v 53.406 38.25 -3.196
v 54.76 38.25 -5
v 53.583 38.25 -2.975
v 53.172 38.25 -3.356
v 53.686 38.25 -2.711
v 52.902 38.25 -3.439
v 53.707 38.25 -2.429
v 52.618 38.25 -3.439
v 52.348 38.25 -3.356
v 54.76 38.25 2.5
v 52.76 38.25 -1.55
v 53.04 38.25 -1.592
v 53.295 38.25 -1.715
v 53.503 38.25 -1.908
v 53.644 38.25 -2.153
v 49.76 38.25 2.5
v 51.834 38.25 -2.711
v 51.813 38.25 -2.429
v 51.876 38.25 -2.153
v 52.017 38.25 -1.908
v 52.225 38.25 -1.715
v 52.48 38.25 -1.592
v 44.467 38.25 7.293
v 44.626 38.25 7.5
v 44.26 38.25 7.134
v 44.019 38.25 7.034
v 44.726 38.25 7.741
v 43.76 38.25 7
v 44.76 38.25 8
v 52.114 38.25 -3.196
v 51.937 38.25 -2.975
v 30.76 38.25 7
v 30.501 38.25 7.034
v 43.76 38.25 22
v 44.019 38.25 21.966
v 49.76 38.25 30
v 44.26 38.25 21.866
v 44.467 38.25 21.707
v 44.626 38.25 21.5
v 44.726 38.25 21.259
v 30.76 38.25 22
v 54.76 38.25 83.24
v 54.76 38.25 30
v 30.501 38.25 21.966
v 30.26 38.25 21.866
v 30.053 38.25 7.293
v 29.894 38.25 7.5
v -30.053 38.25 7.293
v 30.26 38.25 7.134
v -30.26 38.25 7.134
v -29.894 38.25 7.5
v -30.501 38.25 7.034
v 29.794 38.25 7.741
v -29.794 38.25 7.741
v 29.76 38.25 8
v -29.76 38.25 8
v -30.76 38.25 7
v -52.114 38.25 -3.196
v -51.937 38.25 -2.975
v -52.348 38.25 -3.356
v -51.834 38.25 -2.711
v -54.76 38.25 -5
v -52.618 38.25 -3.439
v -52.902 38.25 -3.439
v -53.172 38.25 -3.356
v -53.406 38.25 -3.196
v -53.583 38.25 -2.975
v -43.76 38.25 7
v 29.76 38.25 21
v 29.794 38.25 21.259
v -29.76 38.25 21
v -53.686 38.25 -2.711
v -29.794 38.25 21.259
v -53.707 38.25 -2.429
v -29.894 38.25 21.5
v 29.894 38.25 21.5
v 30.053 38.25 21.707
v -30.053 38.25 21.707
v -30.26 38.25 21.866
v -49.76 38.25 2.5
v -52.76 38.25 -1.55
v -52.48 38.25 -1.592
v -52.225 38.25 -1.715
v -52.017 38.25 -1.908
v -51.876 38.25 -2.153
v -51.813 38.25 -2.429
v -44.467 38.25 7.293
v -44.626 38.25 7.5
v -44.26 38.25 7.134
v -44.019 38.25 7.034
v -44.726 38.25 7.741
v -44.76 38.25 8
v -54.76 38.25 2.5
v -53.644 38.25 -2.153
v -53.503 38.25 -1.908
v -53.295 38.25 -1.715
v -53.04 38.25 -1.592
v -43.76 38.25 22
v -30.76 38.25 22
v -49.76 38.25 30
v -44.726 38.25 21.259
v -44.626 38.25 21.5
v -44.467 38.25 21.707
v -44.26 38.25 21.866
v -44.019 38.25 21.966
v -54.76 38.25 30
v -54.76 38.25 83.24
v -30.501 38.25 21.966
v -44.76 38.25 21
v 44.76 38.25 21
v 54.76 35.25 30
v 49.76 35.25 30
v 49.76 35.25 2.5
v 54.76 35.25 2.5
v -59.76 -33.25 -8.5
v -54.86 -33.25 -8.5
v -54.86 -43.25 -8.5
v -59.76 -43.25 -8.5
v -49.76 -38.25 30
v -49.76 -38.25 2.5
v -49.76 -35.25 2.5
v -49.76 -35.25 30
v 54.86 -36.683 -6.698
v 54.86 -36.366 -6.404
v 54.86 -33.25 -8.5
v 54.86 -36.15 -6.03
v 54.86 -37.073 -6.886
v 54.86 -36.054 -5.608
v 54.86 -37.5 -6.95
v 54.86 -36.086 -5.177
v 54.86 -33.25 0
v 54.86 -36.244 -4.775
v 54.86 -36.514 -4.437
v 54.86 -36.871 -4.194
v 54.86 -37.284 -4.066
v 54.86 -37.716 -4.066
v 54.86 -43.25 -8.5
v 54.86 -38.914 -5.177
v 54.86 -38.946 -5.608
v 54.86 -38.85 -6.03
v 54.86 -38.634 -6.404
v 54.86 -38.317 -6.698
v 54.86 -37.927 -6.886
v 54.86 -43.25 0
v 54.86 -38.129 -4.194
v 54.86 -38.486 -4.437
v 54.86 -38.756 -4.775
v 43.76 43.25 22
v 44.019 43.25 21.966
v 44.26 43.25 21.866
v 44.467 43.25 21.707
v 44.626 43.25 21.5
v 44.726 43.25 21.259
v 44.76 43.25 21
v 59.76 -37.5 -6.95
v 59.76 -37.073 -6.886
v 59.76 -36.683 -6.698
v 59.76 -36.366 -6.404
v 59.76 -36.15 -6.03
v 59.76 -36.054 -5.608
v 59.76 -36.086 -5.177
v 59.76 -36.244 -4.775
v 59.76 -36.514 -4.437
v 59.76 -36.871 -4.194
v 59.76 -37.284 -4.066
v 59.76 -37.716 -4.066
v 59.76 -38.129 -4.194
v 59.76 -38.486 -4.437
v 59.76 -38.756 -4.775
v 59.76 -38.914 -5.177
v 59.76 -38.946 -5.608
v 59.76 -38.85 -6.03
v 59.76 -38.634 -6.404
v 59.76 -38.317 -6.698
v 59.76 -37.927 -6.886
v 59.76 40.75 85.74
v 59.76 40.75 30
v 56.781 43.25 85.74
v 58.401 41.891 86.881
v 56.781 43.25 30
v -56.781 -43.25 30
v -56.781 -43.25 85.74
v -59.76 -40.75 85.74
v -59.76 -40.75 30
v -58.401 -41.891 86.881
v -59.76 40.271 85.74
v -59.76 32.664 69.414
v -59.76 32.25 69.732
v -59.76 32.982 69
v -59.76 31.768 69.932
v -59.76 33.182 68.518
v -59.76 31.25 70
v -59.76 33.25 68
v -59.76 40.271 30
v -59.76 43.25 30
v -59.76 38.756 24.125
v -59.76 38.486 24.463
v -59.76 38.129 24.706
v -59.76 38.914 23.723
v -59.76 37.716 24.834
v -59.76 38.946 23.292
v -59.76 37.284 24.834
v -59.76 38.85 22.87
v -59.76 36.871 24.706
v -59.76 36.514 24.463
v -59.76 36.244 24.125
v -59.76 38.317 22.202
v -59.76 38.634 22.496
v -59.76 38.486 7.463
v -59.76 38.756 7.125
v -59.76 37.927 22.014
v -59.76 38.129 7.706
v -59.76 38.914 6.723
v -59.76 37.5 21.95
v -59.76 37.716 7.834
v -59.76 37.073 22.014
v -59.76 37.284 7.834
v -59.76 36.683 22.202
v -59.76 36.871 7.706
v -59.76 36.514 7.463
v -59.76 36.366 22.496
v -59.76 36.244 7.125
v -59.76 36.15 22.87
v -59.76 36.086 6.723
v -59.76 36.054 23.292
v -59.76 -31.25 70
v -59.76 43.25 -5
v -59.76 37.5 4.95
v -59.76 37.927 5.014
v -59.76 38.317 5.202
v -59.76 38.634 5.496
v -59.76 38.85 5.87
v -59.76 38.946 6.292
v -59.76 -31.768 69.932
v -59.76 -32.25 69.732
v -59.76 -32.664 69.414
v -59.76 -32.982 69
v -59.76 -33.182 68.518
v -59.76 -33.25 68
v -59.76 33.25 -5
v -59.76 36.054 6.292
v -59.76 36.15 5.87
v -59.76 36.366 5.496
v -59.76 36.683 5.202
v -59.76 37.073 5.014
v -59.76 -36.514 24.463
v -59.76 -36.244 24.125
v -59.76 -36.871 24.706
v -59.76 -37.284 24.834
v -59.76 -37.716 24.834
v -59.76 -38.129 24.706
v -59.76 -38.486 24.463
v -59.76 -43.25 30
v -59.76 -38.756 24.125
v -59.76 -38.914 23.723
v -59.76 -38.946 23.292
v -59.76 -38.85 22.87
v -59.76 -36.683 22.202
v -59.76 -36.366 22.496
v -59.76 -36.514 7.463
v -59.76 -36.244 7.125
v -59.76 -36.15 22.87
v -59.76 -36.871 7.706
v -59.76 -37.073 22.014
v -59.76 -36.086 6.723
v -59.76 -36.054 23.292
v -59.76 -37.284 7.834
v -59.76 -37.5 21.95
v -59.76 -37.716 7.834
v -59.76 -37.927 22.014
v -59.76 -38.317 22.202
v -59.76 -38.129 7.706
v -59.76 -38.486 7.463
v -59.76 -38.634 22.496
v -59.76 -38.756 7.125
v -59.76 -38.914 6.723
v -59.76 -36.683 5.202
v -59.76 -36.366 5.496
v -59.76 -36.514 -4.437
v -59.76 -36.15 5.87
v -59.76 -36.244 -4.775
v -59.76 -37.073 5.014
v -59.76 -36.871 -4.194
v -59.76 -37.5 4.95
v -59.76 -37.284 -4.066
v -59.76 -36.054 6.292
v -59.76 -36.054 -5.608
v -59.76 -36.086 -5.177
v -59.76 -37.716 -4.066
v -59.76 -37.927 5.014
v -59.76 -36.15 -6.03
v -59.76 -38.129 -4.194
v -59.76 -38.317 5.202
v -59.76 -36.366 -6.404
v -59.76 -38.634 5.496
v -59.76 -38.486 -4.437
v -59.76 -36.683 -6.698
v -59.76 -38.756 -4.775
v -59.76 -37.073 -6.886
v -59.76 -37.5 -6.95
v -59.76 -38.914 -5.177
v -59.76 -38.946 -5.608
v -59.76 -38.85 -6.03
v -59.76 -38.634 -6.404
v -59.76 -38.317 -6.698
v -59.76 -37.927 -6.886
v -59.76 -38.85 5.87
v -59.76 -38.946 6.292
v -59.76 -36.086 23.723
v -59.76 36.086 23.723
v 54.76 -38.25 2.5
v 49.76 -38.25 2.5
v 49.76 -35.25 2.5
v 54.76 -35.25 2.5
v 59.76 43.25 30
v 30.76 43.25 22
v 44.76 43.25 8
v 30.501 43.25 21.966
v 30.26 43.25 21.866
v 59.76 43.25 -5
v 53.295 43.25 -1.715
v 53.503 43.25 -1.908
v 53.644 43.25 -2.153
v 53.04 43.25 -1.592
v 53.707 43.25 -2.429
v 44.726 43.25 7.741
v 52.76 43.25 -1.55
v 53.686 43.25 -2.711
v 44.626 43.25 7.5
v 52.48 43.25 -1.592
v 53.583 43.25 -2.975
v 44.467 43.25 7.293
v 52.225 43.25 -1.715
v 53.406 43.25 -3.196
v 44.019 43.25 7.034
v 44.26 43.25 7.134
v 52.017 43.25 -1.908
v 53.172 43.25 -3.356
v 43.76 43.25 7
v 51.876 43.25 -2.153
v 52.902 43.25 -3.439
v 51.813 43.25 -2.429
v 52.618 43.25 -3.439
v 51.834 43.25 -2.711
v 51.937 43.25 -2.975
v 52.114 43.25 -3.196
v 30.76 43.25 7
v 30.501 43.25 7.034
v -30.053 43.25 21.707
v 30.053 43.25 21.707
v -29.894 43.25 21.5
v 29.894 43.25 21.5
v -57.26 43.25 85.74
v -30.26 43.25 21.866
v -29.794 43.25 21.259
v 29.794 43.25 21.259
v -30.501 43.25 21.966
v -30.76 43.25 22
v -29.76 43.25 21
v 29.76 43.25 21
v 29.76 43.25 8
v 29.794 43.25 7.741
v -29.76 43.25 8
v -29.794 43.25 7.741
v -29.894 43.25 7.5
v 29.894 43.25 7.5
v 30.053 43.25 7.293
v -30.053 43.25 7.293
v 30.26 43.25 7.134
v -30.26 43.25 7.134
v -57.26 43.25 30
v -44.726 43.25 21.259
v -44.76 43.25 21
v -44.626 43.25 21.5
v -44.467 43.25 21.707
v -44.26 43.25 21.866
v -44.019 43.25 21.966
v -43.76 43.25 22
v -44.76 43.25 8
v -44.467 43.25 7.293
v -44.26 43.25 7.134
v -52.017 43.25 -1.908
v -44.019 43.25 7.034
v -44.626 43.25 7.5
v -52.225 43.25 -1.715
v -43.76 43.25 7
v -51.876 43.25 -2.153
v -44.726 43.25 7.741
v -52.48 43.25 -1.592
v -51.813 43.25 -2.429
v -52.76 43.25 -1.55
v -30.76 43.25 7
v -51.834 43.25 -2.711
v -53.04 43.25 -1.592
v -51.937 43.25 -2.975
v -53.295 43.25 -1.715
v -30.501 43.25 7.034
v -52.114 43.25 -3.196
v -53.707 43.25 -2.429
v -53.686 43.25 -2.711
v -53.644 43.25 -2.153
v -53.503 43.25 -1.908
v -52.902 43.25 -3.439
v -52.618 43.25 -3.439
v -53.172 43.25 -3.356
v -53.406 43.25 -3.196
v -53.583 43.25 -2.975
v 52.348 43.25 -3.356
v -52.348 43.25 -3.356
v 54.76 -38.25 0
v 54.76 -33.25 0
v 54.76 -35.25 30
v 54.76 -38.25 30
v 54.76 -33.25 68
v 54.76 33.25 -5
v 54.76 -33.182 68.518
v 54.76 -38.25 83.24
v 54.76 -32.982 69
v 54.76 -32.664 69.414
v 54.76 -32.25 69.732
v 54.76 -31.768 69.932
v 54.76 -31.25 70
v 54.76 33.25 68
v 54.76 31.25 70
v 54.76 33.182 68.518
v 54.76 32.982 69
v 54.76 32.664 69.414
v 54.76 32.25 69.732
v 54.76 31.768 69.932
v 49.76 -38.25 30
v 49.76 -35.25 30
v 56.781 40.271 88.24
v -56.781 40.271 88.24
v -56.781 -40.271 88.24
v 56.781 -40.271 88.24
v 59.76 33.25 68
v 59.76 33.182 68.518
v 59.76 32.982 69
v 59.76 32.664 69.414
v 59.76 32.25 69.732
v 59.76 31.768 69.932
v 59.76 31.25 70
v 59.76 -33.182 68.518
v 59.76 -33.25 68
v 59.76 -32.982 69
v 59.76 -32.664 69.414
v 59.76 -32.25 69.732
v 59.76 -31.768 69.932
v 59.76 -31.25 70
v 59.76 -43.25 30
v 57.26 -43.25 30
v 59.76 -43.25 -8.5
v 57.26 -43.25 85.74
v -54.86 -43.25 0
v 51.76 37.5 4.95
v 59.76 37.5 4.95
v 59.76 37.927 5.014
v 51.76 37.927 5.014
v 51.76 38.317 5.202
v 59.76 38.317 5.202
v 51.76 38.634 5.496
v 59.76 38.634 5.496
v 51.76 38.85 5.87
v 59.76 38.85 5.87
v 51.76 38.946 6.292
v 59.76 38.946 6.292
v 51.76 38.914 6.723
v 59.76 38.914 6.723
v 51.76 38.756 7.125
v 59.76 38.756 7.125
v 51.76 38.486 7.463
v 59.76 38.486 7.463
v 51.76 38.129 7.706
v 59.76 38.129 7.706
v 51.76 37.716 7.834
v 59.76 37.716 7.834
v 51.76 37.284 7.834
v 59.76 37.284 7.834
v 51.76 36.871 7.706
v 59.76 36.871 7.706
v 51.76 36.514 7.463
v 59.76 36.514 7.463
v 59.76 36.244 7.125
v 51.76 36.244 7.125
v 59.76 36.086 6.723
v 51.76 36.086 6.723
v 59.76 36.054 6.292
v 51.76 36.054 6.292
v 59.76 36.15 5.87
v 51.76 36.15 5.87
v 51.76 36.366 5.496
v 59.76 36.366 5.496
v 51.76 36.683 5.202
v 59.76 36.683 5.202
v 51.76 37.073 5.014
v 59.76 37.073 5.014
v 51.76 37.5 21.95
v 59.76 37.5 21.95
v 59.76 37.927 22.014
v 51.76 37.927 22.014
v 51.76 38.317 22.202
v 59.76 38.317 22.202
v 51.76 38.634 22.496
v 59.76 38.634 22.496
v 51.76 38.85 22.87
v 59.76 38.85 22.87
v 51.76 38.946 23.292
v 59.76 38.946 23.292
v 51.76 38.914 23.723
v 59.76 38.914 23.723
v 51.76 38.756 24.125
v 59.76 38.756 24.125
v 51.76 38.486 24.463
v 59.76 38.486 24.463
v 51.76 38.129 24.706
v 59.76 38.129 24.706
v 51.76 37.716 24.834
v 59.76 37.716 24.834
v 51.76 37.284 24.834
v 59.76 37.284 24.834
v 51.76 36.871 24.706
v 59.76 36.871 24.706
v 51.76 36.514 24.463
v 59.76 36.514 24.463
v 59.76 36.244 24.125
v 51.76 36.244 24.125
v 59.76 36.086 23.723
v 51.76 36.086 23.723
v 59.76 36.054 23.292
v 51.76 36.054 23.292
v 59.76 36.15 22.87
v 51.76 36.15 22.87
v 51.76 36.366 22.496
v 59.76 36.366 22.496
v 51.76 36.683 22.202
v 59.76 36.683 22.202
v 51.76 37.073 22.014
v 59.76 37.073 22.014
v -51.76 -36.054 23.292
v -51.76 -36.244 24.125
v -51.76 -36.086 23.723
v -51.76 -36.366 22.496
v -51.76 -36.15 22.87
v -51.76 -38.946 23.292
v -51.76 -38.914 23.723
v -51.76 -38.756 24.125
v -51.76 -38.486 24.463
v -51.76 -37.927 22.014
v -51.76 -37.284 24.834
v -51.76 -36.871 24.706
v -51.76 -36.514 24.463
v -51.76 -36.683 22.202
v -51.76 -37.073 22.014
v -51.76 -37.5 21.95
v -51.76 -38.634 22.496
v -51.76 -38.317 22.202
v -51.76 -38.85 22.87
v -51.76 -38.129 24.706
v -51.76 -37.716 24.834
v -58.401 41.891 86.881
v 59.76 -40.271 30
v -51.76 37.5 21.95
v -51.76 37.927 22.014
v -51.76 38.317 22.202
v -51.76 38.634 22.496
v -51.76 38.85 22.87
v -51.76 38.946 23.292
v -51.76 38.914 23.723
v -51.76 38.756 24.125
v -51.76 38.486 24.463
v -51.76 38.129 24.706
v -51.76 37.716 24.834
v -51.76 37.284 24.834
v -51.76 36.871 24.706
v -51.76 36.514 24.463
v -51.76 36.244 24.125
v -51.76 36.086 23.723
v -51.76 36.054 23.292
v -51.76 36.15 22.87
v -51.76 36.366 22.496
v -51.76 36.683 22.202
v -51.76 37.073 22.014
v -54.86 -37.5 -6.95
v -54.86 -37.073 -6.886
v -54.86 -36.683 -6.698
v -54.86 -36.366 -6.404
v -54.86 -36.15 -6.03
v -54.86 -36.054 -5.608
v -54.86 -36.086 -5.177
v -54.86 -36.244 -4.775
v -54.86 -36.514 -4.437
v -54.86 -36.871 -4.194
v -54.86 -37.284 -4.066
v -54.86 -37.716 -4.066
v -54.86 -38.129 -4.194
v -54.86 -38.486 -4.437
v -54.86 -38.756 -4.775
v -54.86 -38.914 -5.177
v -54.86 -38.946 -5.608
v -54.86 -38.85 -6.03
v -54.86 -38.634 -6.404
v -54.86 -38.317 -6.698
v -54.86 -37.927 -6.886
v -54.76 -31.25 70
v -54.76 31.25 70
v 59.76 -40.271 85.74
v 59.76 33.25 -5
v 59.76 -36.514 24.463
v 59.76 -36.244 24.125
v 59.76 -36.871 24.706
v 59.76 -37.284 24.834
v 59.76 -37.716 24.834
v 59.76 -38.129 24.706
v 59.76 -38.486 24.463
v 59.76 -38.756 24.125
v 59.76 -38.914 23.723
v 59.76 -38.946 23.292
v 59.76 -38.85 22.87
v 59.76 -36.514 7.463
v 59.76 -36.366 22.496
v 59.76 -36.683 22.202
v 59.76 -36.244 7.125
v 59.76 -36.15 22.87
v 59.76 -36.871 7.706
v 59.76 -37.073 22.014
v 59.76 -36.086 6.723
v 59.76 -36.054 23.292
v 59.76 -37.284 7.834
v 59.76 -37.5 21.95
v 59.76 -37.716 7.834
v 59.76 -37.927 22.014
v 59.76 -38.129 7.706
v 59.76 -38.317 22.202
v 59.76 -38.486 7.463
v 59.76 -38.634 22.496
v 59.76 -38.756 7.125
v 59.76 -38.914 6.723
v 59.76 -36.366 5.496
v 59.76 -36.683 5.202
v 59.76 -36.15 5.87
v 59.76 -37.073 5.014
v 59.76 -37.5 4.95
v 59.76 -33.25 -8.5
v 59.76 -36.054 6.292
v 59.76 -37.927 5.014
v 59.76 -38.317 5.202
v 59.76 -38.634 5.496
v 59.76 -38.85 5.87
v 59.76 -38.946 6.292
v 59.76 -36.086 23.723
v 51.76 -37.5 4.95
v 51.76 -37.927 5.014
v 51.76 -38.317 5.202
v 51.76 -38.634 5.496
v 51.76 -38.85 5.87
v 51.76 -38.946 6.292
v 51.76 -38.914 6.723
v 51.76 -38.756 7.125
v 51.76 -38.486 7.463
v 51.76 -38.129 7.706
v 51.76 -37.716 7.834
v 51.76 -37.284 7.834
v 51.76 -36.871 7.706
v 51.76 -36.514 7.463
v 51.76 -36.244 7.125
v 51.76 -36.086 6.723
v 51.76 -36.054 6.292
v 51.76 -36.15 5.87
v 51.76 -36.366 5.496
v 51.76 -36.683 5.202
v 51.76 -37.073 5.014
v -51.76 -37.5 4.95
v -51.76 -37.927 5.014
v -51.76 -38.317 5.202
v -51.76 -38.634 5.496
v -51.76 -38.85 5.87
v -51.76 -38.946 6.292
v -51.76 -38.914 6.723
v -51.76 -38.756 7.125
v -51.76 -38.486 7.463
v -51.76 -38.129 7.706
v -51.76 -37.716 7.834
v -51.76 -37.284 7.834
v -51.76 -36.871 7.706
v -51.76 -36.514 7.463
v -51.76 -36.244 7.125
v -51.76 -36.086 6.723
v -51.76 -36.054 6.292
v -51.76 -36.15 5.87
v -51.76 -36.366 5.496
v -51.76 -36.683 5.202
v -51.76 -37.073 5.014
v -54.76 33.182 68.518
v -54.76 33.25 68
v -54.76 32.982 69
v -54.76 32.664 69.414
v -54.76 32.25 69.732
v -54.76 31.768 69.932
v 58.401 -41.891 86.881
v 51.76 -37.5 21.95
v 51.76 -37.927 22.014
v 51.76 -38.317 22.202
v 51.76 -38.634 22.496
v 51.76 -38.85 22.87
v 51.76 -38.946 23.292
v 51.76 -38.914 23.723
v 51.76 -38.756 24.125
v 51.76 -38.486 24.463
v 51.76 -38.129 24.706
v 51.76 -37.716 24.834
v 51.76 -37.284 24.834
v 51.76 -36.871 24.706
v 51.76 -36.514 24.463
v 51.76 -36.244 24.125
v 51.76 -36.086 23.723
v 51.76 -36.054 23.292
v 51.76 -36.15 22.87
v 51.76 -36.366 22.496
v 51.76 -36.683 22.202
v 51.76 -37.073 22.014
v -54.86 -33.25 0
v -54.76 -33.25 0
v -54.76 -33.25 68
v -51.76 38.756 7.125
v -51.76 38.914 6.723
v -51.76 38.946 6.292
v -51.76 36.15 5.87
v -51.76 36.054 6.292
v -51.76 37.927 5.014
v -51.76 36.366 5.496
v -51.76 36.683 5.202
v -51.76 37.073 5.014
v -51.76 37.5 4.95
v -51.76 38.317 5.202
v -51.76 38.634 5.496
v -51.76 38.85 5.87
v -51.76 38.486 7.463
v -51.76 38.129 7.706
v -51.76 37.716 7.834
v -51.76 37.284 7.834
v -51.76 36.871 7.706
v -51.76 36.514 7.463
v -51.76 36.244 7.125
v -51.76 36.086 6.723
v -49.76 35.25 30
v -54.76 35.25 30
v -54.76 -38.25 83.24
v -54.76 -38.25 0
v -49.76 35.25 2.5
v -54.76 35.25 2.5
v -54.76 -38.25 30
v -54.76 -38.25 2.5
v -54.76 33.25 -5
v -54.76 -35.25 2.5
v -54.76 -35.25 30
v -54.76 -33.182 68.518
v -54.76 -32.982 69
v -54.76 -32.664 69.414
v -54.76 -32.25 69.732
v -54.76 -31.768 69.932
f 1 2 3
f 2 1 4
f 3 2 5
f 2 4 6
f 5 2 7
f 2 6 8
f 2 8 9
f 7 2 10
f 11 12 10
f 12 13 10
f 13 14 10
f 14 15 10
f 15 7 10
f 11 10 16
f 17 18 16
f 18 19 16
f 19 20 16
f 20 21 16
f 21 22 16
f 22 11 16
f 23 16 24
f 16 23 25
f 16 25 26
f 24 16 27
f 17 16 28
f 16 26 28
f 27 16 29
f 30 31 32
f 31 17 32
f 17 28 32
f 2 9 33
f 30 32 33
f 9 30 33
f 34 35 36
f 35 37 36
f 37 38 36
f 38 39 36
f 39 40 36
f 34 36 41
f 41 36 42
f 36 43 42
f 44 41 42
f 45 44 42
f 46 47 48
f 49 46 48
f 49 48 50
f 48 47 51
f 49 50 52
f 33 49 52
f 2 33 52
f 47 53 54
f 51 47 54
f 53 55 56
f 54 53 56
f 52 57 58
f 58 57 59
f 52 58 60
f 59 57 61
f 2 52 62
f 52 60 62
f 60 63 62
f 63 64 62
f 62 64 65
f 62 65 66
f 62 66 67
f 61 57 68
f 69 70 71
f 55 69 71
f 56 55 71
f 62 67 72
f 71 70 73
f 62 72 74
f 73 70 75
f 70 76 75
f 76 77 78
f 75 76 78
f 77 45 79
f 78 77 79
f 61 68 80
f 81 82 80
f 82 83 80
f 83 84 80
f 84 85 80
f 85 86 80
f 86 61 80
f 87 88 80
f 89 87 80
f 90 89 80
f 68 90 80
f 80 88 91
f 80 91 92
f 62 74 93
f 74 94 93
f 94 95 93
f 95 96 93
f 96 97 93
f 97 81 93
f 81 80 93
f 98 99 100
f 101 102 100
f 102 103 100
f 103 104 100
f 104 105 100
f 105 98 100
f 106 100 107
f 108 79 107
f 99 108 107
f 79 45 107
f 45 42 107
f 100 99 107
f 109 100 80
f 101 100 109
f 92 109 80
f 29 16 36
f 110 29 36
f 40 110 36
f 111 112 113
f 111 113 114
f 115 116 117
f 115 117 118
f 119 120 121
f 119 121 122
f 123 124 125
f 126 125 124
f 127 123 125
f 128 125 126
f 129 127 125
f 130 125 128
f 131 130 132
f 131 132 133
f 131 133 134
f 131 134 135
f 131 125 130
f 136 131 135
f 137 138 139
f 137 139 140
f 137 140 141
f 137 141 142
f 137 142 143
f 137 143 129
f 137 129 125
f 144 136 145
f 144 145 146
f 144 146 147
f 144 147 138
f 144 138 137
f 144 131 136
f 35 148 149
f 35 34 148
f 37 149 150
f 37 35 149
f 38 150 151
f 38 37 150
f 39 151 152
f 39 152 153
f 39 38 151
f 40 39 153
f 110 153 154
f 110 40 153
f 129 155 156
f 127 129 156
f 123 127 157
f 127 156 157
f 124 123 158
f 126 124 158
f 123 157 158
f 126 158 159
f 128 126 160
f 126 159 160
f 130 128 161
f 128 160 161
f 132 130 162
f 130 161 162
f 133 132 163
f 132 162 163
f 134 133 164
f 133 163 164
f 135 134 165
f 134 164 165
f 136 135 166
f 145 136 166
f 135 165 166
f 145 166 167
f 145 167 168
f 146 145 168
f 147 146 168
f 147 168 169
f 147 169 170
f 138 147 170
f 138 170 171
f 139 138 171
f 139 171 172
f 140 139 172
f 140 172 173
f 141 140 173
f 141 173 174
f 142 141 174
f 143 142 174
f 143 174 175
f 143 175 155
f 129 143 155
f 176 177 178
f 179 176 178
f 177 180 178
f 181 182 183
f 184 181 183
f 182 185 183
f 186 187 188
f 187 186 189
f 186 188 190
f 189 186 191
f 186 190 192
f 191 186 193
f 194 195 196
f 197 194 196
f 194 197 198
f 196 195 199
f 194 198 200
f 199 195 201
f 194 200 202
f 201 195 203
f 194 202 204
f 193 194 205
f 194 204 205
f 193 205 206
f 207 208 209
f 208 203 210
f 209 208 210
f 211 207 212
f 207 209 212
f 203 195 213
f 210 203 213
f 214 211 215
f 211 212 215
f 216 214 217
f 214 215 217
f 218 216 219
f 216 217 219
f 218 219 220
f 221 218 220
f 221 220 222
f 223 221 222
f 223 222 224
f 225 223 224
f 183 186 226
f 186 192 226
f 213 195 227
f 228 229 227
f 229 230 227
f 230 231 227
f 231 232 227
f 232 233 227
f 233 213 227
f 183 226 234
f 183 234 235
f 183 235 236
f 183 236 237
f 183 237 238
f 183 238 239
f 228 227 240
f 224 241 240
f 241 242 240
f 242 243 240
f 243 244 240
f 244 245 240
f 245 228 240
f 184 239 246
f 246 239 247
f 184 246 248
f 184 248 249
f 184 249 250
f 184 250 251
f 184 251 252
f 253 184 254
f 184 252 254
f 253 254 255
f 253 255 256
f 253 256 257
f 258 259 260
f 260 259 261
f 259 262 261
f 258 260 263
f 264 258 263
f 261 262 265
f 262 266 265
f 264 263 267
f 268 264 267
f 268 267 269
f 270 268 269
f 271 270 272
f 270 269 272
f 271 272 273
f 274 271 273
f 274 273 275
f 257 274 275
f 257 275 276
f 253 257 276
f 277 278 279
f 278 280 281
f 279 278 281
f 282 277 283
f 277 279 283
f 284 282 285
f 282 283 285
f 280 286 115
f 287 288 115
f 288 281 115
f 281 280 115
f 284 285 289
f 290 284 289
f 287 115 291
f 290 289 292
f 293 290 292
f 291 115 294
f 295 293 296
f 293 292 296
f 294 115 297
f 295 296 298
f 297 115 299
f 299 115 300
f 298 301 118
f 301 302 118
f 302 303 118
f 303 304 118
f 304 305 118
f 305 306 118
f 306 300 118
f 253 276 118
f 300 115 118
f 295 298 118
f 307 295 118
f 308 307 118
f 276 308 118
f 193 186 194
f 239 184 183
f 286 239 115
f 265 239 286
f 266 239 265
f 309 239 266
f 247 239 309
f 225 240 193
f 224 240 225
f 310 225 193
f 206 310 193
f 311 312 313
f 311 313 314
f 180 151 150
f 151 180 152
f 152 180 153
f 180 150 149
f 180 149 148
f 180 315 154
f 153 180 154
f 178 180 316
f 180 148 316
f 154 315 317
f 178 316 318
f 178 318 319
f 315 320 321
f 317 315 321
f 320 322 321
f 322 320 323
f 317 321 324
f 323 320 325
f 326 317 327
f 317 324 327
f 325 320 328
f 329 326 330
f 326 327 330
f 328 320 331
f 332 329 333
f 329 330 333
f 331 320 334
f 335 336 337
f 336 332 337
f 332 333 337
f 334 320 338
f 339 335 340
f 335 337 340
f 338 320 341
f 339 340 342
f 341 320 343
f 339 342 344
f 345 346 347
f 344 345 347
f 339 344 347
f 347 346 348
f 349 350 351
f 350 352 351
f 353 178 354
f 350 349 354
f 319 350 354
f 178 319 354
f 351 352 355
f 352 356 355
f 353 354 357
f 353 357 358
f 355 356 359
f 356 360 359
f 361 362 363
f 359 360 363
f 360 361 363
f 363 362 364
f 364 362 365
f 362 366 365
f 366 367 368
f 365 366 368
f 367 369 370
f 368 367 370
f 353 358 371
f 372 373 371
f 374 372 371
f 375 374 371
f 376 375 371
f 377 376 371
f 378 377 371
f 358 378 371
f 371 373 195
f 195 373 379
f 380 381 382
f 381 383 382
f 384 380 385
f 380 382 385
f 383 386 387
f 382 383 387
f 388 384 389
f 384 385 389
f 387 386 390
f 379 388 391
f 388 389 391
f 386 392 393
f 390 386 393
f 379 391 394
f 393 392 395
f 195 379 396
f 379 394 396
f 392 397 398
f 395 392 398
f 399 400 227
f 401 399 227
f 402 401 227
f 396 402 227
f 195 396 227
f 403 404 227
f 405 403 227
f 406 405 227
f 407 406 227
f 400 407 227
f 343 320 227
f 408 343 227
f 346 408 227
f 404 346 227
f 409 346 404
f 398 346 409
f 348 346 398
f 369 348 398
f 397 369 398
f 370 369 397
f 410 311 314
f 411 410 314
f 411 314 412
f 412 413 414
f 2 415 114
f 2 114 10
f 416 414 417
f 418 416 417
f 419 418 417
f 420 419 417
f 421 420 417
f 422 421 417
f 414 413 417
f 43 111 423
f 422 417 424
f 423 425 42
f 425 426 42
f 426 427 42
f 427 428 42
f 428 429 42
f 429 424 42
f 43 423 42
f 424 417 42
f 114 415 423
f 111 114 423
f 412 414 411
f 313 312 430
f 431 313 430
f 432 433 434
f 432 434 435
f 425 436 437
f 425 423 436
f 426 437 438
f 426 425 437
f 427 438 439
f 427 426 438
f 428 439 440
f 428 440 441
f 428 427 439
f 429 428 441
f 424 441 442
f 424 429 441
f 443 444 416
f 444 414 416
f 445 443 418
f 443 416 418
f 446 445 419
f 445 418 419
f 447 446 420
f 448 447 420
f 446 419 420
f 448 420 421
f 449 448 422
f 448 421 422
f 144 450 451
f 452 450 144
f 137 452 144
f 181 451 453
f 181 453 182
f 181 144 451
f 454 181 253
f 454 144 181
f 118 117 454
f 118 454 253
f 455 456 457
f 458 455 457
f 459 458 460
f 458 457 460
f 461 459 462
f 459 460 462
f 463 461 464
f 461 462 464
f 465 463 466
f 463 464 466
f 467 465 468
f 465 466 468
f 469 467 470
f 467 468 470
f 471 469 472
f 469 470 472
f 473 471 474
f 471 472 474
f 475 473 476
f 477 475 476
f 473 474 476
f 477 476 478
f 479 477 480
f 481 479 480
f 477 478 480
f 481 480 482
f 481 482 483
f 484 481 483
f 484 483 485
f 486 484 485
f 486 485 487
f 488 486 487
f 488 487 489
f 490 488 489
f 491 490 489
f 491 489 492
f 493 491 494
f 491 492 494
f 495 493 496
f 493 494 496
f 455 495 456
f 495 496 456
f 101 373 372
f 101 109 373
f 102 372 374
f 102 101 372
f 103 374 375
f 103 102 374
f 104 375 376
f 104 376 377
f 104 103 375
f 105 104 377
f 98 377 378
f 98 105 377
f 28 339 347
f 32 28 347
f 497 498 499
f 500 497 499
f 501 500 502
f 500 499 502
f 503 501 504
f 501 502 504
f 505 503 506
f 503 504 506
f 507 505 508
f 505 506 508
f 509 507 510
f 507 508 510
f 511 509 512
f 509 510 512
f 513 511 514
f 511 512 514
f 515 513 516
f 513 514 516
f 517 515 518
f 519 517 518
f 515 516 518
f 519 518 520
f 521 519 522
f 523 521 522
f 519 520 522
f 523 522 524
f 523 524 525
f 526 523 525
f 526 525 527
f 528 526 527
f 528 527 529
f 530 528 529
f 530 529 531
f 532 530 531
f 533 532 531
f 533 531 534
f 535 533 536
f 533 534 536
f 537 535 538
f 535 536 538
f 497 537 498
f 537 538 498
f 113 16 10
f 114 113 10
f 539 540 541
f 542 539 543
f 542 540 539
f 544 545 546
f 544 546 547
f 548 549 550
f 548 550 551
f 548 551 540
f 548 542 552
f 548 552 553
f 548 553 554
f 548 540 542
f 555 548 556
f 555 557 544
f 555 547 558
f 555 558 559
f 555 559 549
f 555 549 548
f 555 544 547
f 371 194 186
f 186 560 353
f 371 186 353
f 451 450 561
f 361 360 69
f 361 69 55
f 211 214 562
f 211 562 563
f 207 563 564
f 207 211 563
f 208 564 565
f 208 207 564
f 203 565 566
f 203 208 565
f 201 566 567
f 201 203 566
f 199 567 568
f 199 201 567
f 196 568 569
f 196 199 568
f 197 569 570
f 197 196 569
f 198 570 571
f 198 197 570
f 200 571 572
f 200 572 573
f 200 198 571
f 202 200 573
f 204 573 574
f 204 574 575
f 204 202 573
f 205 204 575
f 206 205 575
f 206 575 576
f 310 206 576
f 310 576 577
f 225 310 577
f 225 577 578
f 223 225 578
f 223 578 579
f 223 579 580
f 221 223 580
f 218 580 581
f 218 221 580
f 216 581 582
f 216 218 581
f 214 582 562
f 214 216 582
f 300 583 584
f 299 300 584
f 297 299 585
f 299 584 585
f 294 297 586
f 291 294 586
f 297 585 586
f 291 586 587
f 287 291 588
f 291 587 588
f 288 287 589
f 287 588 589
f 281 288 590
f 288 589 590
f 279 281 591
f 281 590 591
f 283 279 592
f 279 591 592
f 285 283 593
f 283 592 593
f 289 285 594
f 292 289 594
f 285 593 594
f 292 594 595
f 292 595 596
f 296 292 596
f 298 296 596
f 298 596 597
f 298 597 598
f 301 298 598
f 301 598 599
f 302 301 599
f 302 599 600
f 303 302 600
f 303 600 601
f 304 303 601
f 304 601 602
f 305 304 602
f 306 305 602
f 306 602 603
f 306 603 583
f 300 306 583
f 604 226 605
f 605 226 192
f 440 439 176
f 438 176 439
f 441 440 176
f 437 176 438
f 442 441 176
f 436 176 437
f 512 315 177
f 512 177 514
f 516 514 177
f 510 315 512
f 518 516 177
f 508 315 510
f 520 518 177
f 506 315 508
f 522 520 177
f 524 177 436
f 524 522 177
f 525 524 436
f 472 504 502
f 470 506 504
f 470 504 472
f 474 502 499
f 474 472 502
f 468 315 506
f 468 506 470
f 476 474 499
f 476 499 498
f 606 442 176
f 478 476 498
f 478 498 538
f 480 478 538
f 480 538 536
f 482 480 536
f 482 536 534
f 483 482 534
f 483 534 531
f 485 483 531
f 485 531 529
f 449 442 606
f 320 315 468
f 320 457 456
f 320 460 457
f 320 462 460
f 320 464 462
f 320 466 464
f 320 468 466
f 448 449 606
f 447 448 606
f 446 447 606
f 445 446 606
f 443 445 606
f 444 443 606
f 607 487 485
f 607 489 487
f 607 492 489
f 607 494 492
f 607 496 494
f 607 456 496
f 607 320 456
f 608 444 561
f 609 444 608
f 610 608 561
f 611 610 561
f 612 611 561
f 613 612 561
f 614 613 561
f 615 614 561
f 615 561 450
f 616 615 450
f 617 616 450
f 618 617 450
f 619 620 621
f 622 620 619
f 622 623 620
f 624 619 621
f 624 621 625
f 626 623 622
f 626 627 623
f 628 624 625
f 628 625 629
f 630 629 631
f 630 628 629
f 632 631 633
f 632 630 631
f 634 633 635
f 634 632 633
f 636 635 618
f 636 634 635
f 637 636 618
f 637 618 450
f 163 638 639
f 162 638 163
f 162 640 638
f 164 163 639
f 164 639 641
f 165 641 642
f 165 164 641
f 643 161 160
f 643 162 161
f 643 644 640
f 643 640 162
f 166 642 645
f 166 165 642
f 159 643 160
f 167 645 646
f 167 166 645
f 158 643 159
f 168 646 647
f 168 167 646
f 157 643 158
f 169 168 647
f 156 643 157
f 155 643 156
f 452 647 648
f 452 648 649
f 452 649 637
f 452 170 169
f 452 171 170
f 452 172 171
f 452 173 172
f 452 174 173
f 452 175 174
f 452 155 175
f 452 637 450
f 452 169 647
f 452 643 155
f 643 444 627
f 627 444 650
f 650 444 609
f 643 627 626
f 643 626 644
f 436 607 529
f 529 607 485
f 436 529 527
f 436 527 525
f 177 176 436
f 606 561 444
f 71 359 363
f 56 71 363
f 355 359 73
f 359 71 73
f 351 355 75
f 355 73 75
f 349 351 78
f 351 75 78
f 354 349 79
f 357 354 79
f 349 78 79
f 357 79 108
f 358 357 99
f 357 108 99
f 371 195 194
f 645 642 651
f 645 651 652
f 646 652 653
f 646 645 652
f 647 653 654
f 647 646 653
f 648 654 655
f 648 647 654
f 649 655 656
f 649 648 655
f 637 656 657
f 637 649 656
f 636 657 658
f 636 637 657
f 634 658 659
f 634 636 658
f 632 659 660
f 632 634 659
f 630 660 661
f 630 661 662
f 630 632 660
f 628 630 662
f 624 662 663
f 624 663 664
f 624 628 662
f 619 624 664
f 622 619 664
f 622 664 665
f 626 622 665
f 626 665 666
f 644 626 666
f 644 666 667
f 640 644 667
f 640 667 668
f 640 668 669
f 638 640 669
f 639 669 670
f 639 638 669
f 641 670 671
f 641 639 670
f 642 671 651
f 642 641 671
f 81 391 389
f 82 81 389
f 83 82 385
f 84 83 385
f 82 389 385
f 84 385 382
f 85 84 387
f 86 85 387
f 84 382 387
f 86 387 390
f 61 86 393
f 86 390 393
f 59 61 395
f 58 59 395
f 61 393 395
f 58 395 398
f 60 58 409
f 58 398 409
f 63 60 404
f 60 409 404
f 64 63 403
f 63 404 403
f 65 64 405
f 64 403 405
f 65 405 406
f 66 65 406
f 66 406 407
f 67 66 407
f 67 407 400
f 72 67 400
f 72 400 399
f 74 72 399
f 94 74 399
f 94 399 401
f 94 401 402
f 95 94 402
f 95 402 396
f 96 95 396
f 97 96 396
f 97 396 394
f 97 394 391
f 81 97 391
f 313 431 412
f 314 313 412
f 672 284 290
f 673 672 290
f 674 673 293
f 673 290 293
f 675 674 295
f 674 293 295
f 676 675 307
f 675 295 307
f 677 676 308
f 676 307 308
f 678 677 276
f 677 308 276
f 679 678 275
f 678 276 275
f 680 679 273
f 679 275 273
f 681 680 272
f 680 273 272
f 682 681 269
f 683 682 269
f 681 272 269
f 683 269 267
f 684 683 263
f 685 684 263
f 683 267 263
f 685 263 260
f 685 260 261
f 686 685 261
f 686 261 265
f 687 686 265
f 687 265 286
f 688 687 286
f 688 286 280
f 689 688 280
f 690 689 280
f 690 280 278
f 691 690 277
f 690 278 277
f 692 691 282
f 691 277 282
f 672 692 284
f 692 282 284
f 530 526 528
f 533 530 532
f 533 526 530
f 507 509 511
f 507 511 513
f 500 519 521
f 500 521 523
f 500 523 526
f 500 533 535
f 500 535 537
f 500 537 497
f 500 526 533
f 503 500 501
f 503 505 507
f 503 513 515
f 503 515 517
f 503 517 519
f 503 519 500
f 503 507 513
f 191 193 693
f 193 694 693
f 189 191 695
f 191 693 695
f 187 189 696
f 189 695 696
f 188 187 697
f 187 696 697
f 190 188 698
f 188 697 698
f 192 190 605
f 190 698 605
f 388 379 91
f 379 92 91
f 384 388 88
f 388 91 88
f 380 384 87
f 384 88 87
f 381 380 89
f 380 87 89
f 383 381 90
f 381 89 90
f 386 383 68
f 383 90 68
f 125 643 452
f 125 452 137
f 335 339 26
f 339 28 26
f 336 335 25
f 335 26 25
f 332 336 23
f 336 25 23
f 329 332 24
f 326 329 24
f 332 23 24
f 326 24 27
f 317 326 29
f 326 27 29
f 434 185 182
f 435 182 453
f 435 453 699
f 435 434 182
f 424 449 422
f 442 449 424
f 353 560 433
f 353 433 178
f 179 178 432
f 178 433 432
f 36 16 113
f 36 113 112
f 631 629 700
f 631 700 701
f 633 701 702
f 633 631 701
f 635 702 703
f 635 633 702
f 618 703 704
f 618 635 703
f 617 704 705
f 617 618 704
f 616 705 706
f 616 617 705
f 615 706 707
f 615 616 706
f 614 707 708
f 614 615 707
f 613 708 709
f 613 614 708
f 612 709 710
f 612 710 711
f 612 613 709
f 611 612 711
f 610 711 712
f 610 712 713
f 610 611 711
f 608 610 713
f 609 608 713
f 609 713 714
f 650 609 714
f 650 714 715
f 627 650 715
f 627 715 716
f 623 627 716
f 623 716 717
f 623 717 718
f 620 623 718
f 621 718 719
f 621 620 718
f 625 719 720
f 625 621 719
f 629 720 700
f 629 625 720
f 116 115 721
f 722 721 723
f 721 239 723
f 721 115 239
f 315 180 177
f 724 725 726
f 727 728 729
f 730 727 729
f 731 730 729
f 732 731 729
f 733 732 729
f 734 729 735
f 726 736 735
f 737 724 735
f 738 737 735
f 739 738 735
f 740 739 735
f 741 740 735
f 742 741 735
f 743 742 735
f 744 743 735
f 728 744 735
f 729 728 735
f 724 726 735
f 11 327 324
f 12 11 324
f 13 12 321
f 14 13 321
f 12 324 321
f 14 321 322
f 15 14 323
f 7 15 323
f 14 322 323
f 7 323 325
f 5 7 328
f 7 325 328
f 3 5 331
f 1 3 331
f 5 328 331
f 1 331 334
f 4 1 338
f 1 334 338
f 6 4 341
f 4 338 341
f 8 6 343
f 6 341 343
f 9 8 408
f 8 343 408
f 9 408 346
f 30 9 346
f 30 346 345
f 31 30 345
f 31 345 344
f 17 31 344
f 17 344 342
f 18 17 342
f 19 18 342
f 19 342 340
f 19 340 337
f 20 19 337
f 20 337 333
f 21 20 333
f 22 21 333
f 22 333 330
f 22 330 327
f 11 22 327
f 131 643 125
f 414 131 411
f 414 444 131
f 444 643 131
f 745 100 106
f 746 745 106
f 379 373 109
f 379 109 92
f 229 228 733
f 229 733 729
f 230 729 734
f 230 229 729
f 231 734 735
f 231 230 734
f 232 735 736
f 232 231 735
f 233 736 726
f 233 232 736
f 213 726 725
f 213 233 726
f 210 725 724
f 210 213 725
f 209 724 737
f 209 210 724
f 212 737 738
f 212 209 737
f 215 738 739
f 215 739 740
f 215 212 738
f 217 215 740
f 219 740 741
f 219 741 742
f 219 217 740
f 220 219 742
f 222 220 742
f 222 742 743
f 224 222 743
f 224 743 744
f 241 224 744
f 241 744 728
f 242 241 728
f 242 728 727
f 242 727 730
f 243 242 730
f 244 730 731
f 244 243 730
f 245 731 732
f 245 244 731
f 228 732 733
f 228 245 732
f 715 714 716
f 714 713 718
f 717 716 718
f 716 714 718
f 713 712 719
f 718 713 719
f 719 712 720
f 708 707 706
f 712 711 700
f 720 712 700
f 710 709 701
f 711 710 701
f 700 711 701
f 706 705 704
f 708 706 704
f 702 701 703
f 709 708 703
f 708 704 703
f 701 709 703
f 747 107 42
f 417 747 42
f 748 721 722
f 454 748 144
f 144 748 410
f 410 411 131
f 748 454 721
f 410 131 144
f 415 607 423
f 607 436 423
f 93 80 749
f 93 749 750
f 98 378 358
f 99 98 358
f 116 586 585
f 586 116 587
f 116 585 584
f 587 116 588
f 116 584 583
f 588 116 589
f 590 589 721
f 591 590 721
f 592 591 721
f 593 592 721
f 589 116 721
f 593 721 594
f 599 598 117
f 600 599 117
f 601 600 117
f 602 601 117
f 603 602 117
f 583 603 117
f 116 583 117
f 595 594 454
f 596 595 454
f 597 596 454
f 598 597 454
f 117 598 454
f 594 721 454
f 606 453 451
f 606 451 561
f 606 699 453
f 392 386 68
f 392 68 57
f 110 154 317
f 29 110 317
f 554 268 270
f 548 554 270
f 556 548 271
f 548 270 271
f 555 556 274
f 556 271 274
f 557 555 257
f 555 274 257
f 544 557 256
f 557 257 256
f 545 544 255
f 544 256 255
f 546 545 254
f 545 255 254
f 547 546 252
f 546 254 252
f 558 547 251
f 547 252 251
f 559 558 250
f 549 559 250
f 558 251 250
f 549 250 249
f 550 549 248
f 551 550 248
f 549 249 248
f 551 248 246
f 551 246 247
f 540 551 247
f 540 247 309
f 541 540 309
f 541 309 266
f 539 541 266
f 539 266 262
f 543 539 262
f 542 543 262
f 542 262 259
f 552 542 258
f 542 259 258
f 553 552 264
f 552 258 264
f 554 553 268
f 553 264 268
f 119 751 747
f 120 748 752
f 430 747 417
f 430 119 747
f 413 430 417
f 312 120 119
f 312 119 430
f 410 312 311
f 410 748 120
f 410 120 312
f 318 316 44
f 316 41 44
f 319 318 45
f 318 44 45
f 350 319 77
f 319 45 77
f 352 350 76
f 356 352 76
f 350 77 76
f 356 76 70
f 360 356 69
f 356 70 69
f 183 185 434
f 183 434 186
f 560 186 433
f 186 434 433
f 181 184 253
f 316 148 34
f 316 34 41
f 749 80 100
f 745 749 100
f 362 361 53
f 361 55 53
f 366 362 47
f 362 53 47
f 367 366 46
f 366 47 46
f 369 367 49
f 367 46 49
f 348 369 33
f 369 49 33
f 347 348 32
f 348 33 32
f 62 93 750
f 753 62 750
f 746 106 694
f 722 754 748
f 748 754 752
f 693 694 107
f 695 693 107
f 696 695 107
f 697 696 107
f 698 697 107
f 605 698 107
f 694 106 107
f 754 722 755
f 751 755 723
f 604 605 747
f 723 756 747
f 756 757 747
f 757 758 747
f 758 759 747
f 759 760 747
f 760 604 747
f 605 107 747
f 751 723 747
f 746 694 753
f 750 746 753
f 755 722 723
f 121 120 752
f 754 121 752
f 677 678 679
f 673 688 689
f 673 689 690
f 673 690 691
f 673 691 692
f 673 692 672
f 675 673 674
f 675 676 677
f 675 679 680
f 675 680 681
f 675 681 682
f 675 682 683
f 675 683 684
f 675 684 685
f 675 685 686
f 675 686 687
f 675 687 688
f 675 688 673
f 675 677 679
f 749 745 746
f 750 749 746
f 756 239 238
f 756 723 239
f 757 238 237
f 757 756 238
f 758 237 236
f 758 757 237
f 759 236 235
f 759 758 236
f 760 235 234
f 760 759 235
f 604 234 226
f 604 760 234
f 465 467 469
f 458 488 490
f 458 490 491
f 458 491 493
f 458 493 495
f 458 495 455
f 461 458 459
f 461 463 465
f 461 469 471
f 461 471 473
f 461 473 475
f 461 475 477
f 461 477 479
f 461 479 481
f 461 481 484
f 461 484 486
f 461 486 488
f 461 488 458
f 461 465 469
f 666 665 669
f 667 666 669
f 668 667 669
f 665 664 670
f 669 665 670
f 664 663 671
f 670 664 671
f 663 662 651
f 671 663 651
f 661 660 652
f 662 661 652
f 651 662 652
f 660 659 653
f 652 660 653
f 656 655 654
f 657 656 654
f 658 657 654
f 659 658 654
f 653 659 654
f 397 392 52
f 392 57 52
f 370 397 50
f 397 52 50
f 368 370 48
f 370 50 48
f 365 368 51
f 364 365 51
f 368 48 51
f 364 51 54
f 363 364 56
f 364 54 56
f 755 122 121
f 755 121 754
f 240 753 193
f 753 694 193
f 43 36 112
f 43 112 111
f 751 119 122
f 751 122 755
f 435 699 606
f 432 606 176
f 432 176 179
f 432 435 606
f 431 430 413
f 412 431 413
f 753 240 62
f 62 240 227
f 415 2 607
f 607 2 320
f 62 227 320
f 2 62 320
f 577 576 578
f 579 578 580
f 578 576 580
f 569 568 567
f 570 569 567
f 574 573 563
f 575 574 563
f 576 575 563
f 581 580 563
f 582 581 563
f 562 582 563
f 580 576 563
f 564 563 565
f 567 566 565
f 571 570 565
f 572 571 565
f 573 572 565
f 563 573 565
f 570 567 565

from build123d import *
from OCP.BRepFilletAPI import BRepFilletAPI_MakeChamfer

# Parameters (mm, degrees)
SKETCH1_W                                  = 119.52
SKETCH1_H                                  = 86.5
BOSS_EXTRUDE1_DEPTH                        = 88.24
SHELL1_T                                   = -5
CHAMFER1_SIZE                              = 2.5
CHAMFER1_SIZE2                             = 2.979383981
CHAMFER2_SIZE                              = 2.5
CHAMFER2_SIZE2                             = 2.979383981
CHAMFER3_SIZE                              = 2.5
CHAMFER3_SIZE2                             = 2.979383981
CUT_EXTRUDE1_REACH                         = 156.732
SKETCH3_W                                  = 70
SKETCH3_H                                  = 66.5
FILLET1_R                                  = 2
FILLET1_OF_MIRROR1_R                       = 2
SKETCH4_W                                  = 109.52
SKETCH4_H                                  = 5
BOSS_EXTRUDE2_DEPTH                        = 5
CUT_EXTRUDE2_REACH                         = 139.258
SKETCH5_R                                  = 0.95
BOSS_EXTRUDE3_DEPTH                        = 8.5
BOSS_EXTRUDE4_DEPTH                        = 5
BOSS_EXTRUDE6_DEPTH                        = 35
BOSS_EXTRUDE7_DEPTH                        = 8.5
BOSS_EXTRUDE8_DEPTH                        = 35
BOSS_EXTRUDE9_DEPTH                        = 38.5
SKETCH16_W                                 = 5
SKETCH16_H                                 = 27.5
BOSS_EXTRUDE10_DEPTH                       = 3
MIRROR7_COPY_1_SKETCH_W                    = 5
MIRROR7_COPY_1_SKETCH_H                    = 27.5
MIRROR7_COPY_1_DEPTH                       = 3
SKETCH15_R                                 = 1.45
CUT_EXTRUDE5_DEPTH                         = 8
MIRROR8_AT_THE_SECOND_PLANE_COPY_1_SKETC_R = 1.45
MIRROR8_AT_THE_SECOND_PLANE_COPY_1_DEPTH   = 8
SKETCH17_R                                 = 1.45
CUT_EXTRUDE6_DEPTH                         = 8
SKETCH18_R                                 = 1.45
CUT_EXTRUDE7_DEPTH                         = 8
SKETCH19_W                                 = 15
SKETCH19_H                                 = 15
CUT_EXTRUDE8_DEPTH                         = 5
FILLET2_R                                  = 1
FILLET2_OF_MIRROR10_R                      = 1


with BuildPart() as part:
    # Sketch1 → Boss-Extrude1 (new body)
    with BuildSketch(Plane.XY):
        Rectangle(SKETCH1_W, SKETCH1_H)
    extrude(amount=BOSS_EXTRUDE1_DEPTH)

    # Shell1
    shell1_openings = [part.faces().sort_by_distance(p)[0] for p in [
        (0, 0, 0),
    ]]
    offset(amount=SHELL1_T, openings=shell1_openings, kind=Kind.INTERSECTION)

    # Chamfer1: one chamfer whose edges measure the first distance from different faces: ONE call of the kernel's chamfer builder (chamfer() names one face for all edges)
    chamfer1_edges_1 = [part.edges().sort_by_distance(p)[0] for p in [
        (59.76, 0, 88.24),
    ]]
    chamfer1_side_1 = [part.faces().sort_by_distance(p)[0] for p in [
        (59.76, 0, 44.12),
    ]]
    chamfer1_edges_2 = [part.edges().sort_by_distance(p)[0] for p in [
        (0, 43.25, 88.24),
    ]]
    chamfer1_side_2 = [part.faces().sort_by_distance(p)[0] for p in [
        (0, 43.25, 44.12),
    ]]
    chamfer1_edges_3 = [part.edges().sort_by_distance(p)[0] for p in [
        (-59.76, 0, 88.24),
    ]]
    chamfer1_side_3 = [part.faces().sort_by_distance(p)[0] for p in [
        (-59.76, 0, 44.12),
    ]]
    chamfer1_edges_4 = [part.edges().sort_by_distance(p)[0] for p in [
        (0, -43.25, 88.24),
    ]]
    chamfer1_side_4 = [part.faces().sort_by_distance(p)[0] for p in [
        (0, -43.25, 44.12),
    ]]
    chamfer1 = BRepFilletAPI_MakeChamfer(part.part.solid().wrapped)
    for e in chamfer1_edges_1:
        chamfer1.Add(CHAMFER1_SIZE, CHAMFER1_SIZE2, e.wrapped, chamfer1_side_1[0].wrapped)  # the first distance lies on this face
    for e in chamfer1_edges_2:
        chamfer1.Add(CHAMFER1_SIZE, CHAMFER1_SIZE2, e.wrapped, chamfer1_side_2[0].wrapped)  # the first distance lies on this face
    for e in chamfer1_edges_3:
        chamfer1.Add(CHAMFER1_SIZE, CHAMFER1_SIZE2, e.wrapped, chamfer1_side_3[0].wrapped)  # the first distance lies on this face
    for e in chamfer1_edges_4:
        chamfer1.Add(CHAMFER1_SIZE, CHAMFER1_SIZE2, e.wrapped, chamfer1_side_4[0].wrapped)  # the first distance lies on this face
    add(Compound.cast(chamfer1.Shape()), mode=Mode.REPLACE)

    # Chamfer2
    chamfer2_edges = [part.edges().sort_by_distance(p)[0] for p in [
        (-59.76, 43.25, 42.87),
    ]]
    chamfer2_side = [part.faces().sort_by_distance(p)[0] for p in [
        (0, 43.25, 42.87),
    ]]
    chamfer(chamfer2_edges, length=CHAMFER2_SIZE, length2=CHAMFER2_SIZE2, reference=chamfer2_side[0])

    # Chamfer3: one chamfer whose edges measure the first distance from different faces: ONE call of the kernel's chamfer builder (chamfer() names one face for all edges)
    chamfer3_edges_1 = [part.edges().sort_by_distance(p)[0] for p in [
        (59.76, -43.25, 42.87),
    ]]
    chamfer3_side_1 = [part.faces().sort_by_distance(p)[0] for p in [
        (0, -43.25, 42.87),
    ]]
    chamfer3_edges_2 = [part.edges().sort_by_distance(p)[0] for p in [
        (-59.76, -43.25, 42.87),
    ]]
    chamfer3_side_2 = [part.faces().sort_by_distance(p)[0] for p in [
        (-59.76, -1.489691991, 42.87),
    ]]
    chamfer3_edges_3 = [part.edges().sort_by_distance(p)[0] for p in [
        (59.76, 43.25, 42.87),
    ]]
    chamfer3_side_3 = [part.faces().sort_by_distance(p)[0] for p in [
        (59.76, 0, 42.87),
    ]]
    chamfer3 = BRepFilletAPI_MakeChamfer(part.part.solid().wrapped)
    for e in chamfer3_edges_1:
        chamfer3.Add(CHAMFER3_SIZE, CHAMFER3_SIZE2, e.wrapped, chamfer3_side_1[0].wrapped)  # the first distance lies on this face
    for e in chamfer3_edges_2:
        chamfer3.Add(CHAMFER3_SIZE, CHAMFER3_SIZE2, e.wrapped, chamfer3_side_2[0].wrapped)  # the first distance lies on this face
    for e in chamfer3_edges_3:
        chamfer3.Add(CHAMFER3_SIZE, CHAMFER3_SIZE2, e.wrapped, chamfer3_side_3[0].wrapped)  # the first distance lies on this face
    add(Compound.cast(chamfer3.Shape()), mode=Mode.REPLACE)

    # Sketch3 → Cut-Extrude1 (cut, up to next)
    with BuildSketch(Plane(origin=(59.76, 0, 0), x_dir=(0, 0, -1), z_dir=(1, 0, 0)), mode=Mode.PRIVATE) as cut_extrude1_sk1:
        with Locations((-35, 0)):
            Rectangle(SKETCH3_W, SKETCH3_H)
    cut_extrude1_tool1 = extrude(cut_extrude1_sk1.sketch, amount=-CUT_EXTRUDE1_REACH, mode=Mode.PRIVATE) & part.part
    cut_extrude1 = cut_extrude1_tool1.solids().sort_by_distance((59.76, 0, 35))[0]
    add(cut_extrude1, mode=Mode.SUBTRACT)

    # Fillet1
    fillet1_edges = [part.edges().sort_by_distance(p)[0] for p in [
        (57.26, -33.25, 70),
        (57.26, 33.25, 70),
    ]]
    fillet(fillet1_edges, radius=FILLET1_R)

    # Mirror1: Cut-Extrude1 across plane
    add(cut_extrude1.mirror(Plane(origin=(0, 0, 0), x_dir=(0, 0, 1), z_dir=(1, 0, 0))), mode=Mode.SUBTRACT)

    # Fillet1 of Mirror1
    fillet1_of_mirror1_edges = [part.edges().sort_by_distance(p)[0] for p in [
        (-57.26, -33.25, 70),
        (-57.26, 33.25, 70),
    ]]
    fillet(fillet1_of_mirror1_edges, radius=FILLET1_OF_MIRROR1_R)

    # Sketch4 → Boss-Extrude2 (add)
    with BuildSketch(Plane(origin=(0, 0, 0), x_dir=(-1, 0, 0), z_dir=(0, 0, -1))):
        with Locations((0, 40.75)):
            Rectangle(SKETCH4_W, SKETCH4_H)
    extrude(amount=BOSS_EXTRUDE2_DEPTH)

    # Sketch5 → Cut-Extrude2 (cut, up to next)
    with BuildSketch(Plane(origin=(0, 43.25, 0), x_dir=(1, 0, 0), z_dir=(0, 1, 0)), mode=Mode.PRIVATE) as cut_extrude2_sk1:
        with Locations(Location((-52.76, 2.5, 0), (0, 0, 270))):
            Circle(SKETCH5_R)
    cut_extrude2_tool1 = extrude(cut_extrude2_sk1.sketch, amount=-CUT_EXTRUDE2_REACH, mode=Mode.PRIVATE) & part.part
    # Sketch5 → Cut-Extrude2 (cut, up to next)
    with BuildSketch(Plane(origin=(0, 43.25, 0), x_dir=(1, 0, 0), z_dir=(0, 1, 0)), mode=Mode.PRIVATE) as cut_extrude2_sk2:
        with Locations(Location((52.76, 2.5, 0), (0, 0, 270))):
            Circle(SKETCH5_R)
    cut_extrude2_tool2 = extrude(cut_extrude2_sk2.sketch, amount=-CUT_EXTRUDE2_REACH, mode=Mode.PRIVATE) & part.part
    add(cut_extrude2_tool1.solids().sort_by_distance((-52.76, 43.25, -2.5))[0], mode=Mode.SUBTRACT)
    add(cut_extrude2_tool2.solids().sort_by_distance((52.76, 43.25, -2.5))[0], mode=Mode.SUBTRACT)

    # Sketch6 → Boss-Extrude3 (add)
    with BuildSketch(Plane(origin=(0, 0, 0), x_dir=(-1, 0, 0), z_dir=(0, 0, -1))):
        Polygon((-59.76, -33.25), (-54.86, -33.25), (-54.86, -43.25), (-57.26, -43.25), (-59.76, -40.270616019), align=None)
    extrude(amount=BOSS_EXTRUDE3_DEPTH)

    # Sketch8 → Boss-Extrude4 (add)
    with BuildSketch(Plane(origin=(0, 0, 0), x_dir=(-1, 0, 0), z_dir=(0, 0, -1))):
        Polygon((57.26, 43.25), (54.76, 43.25), (54.76, 38.25), (54.76, 33.25), (59.76, 33.25), (59.76, 40.270616019), align=None)
        Polygon((-54.76, 33.25), (-54.76, 38.25), (-54.76, 43.25), (-56.780616019, 43.25), (-59.76, 40.75), (-59.76, 33.25), align=None)
    extrude(amount=BOSS_EXTRUDE4_DEPTH)

    # Sketch10 → Boss-Extrude6 (add)
    with BuildSketch(Plane(origin=(0, 0, -5), x_dir=(-1, 0, 0), z_dir=(0, 0, -1))):
        Polygon((-59.76, 40.75), (-59.76, 43.25), (-56.780616019, 43.25), align=None)
    extrude(amount=-BOSS_EXTRUDE6_DEPTH)

    # Sketch11 → Boss-Extrude7 (add)
    with BuildSketch(Plane(origin=(0, 0, 0), x_dir=(-1, 0, 0), z_dir=(0, 0, -1))):
        Polygon((59.76, -33.25), (54.86, -33.25), (54.86, -43.25), (56.780616019, -43.25), (59.76, -40.75), align=None)
    extrude(amount=BOSS_EXTRUDE7_DEPTH)

    # Sketch13 → Boss-Extrude8 (add)
    with BuildSketch(Plane(origin=(0, 0, -5), x_dir=(-1, 0, 0), z_dir=(0, 0, -1))):
        Polygon((57.26, 43.25), (59.76, 43.25), (59.76, 40.270616019), align=None)
    extrude(amount=-BOSS_EXTRUDE8_DEPTH)

    # Sketch14 → Boss-Extrude9 (add)
    with BuildSketch(Plane(origin=(0, 0, -8.5), x_dir=(-1, 0, 0), z_dir=(0, 0, -1))):
        Polygon((-59.76, -40.270616019), (-59.76, -43.25), (-57.26, -43.25), align=None)
        Polygon((59.76, -40.75), (59.76, -43.25), (56.780616019, -43.25), align=None)
    extrude(amount=-BOSS_EXTRUDE9_DEPTH)

    # Sketch16 → Boss-Extrude10 (add)
    with BuildSketch(Plane.XZ.offset(-38.25)):
        with Locations((52.26, 16.25)):
            Rectangle(SKETCH16_W, SKETCH16_H)
    boss_extrude10 = extrude(amount=BOSS_EXTRUDE10_DEPTH)

    # Mirror6: Boss-Extrude10 across plane
    add(boss_extrude10.mirror(Plane(origin=(0, 0, 0), x_dir=(0, 0, 1), z_dir=(1, 0, 0))))

    # Mirror7: Boss-Extrude10 across plane
    add(boss_extrude10.mirror(Plane.ZX))

    # Mirror7 copy 1 sketch → Mirror7 copy 1 (add)
    with BuildSketch(Plane(origin=(0, -38.25, 0), x_dir=(-1, 0, 0), z_dir=(0, 1, 0))):
        with Locations((52.26, 16.25)):
            Rectangle(MIRROR7_COPY_1_SKETCH_W, MIRROR7_COPY_1_SKETCH_H)
    extrude(amount=MIRROR7_COPY_1_DEPTH)

    # Sketch15 → Cut-Extrude5 (cut)
    with BuildSketch(Plane(origin=(59.76, 0, 0), x_dir=(0, 0, -1), z_dir=(1, 0, 0))):
        with Locations((-6.4, 37.5)):
            Circle(SKETCH15_R)
        with Locations((-23.4, 37.5)):
            Circle(SKETCH15_R)
    cut_extrude5 = extrude(amount=-CUT_EXTRUDE5_DEPTH, mode=Mode.SUBTRACT)

    # Mirror8: Cut-Extrude5 across plane
    add(cut_extrude5.mirror(Plane.ZX), mode=Mode.SUBTRACT)

    # Mirror8 at the second plane: Cut-Extrude5 across plane
    add(cut_extrude5.mirror(Plane(origin=(0, 0, 0), x_dir=(0, 0, 1), z_dir=(1, 0, 0))), mode=Mode.SUBTRACT)

    # Mirror8 at the second plane copy 1 sketc → Mirror8 at the second plane copy 1 (cut)
    with BuildSketch(Plane(origin=(-59.76, 0, 0), x_dir=(0, 0, -1), z_dir=(-1, 0, 0))):
        with Locations((-6.4, 37.5)):
            Circle(MIRROR8_AT_THE_SECOND_PLANE_COPY_1_SKETC_R)
        with Locations((-23.4, 37.5)):
            Circle(MIRROR8_AT_THE_SECOND_PLANE_COPY_1_SKETC_R)
    extrude(amount=-MIRROR8_AT_THE_SECOND_PLANE_COPY_1_DEPTH, mode=Mode.SUBTRACT)

    # Sketch17 → Cut-Extrude6 (cut)
    with BuildSketch(Plane(origin=(59.76, 0, 0), x_dir=(0, 0, -1), z_dir=(1, 0, 0))):
        with Locations((5.5, -37.5)):
            Circle(SKETCH17_R)
    extrude(amount=-CUT_EXTRUDE6_DEPTH, mode=Mode.SUBTRACT)

    # Sketch18 → Cut-Extrude7 (cut)
    with BuildSketch(Plane(origin=(-54.86, 0, 0), x_dir=(0, 0, -1), z_dir=(1, 0, 0))):
        with Locations((5.5, -37.5)):
            Circle(SKETCH18_R)
    extrude(amount=-CUT_EXTRUDE7_DEPTH, mode=Mode.SUBTRACT)

    # Sketch19 → Cut-Extrude8 (cut)
    with BuildSketch(Plane(origin=(0, 43.25, 0), x_dir=(1, 0, 0), z_dir=(0, 1, 0))):
        with Locations((-37.26, -14.5)):
            Rectangle(SKETCH19_W, SKETCH19_H)
    cut_extrude8 = extrude(amount=-CUT_EXTRUDE8_DEPTH, mode=Mode.SUBTRACT)

    # Fillet2
    fillet2_edges = [part.edges().sort_by_distance(p)[0] for p in [
        (-44.76, 40.75, 22),
        (-44.76, 40.75, 7),
        (-29.76, 40.75, 7),
        (-29.76, 40.75, 22),
    ]]
    fillet(fillet2_edges, radius=FILLET2_R)

    # Mirror10: Cut-Extrude8 across plane
    add(cut_extrude8.mirror(Plane(origin=(0, 0, 0), x_dir=(0, 0, 1), z_dir=(1, 0, 0))), mode=Mode.SUBTRACT)

    # Fillet2 of Mirror10
    fillet2_of_mirror10_edges = [part.edges().sort_by_distance(p)[0] for p in [
        (44.76, 40.75, 22),
        (44.76, 40.75, 7),
        (29.76, 40.75, 7),
        (29.76, 40.75, 22),
    ]]
    fillet(fillet2_of_mirror10_edges, radius=FILLET2_OF_MIRROR10_R)


solid = part.part
